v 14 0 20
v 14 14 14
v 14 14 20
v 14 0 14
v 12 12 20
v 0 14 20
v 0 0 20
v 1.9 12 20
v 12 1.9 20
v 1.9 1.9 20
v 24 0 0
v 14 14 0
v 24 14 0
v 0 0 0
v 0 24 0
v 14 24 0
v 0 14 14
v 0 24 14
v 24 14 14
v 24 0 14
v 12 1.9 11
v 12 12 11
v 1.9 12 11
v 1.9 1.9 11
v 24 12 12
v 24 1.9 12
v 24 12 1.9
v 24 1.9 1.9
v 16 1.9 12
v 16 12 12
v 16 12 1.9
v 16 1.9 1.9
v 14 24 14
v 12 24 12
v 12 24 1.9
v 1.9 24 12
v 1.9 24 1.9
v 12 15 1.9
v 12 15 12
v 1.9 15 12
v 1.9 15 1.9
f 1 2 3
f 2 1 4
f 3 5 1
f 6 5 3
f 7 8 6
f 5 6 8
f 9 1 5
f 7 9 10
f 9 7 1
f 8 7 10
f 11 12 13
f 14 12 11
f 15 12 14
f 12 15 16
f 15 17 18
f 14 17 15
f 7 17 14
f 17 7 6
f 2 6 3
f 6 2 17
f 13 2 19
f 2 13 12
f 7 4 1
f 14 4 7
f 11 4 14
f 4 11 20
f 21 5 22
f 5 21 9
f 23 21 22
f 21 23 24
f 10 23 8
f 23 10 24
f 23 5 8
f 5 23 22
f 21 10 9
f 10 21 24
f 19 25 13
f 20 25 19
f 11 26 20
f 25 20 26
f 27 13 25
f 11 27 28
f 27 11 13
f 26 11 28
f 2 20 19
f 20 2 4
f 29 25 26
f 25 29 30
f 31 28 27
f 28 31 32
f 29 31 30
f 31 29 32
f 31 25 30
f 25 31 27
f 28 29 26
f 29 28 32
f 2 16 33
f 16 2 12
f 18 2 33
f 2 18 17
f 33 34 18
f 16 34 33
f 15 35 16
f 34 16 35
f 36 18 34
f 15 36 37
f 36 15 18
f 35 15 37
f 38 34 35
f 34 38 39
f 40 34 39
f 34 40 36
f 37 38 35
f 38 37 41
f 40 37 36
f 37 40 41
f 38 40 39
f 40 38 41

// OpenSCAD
difference()
{
  cube([14,14,20]);
  translate([1.9,1.9,11]) cube([10.1,10.1,10]);
}

difference()
{
  translate([14,0,0]) cube([10,14,14]);
  translate([16,1.9,1.9]) cube([10,10.1,10.1]);
}

difference()
{
  translate([0,14,0]) cube([14,10,14]);
  translate([1.9,15,1.9]) cube([10.1,10,10.1]);
}
